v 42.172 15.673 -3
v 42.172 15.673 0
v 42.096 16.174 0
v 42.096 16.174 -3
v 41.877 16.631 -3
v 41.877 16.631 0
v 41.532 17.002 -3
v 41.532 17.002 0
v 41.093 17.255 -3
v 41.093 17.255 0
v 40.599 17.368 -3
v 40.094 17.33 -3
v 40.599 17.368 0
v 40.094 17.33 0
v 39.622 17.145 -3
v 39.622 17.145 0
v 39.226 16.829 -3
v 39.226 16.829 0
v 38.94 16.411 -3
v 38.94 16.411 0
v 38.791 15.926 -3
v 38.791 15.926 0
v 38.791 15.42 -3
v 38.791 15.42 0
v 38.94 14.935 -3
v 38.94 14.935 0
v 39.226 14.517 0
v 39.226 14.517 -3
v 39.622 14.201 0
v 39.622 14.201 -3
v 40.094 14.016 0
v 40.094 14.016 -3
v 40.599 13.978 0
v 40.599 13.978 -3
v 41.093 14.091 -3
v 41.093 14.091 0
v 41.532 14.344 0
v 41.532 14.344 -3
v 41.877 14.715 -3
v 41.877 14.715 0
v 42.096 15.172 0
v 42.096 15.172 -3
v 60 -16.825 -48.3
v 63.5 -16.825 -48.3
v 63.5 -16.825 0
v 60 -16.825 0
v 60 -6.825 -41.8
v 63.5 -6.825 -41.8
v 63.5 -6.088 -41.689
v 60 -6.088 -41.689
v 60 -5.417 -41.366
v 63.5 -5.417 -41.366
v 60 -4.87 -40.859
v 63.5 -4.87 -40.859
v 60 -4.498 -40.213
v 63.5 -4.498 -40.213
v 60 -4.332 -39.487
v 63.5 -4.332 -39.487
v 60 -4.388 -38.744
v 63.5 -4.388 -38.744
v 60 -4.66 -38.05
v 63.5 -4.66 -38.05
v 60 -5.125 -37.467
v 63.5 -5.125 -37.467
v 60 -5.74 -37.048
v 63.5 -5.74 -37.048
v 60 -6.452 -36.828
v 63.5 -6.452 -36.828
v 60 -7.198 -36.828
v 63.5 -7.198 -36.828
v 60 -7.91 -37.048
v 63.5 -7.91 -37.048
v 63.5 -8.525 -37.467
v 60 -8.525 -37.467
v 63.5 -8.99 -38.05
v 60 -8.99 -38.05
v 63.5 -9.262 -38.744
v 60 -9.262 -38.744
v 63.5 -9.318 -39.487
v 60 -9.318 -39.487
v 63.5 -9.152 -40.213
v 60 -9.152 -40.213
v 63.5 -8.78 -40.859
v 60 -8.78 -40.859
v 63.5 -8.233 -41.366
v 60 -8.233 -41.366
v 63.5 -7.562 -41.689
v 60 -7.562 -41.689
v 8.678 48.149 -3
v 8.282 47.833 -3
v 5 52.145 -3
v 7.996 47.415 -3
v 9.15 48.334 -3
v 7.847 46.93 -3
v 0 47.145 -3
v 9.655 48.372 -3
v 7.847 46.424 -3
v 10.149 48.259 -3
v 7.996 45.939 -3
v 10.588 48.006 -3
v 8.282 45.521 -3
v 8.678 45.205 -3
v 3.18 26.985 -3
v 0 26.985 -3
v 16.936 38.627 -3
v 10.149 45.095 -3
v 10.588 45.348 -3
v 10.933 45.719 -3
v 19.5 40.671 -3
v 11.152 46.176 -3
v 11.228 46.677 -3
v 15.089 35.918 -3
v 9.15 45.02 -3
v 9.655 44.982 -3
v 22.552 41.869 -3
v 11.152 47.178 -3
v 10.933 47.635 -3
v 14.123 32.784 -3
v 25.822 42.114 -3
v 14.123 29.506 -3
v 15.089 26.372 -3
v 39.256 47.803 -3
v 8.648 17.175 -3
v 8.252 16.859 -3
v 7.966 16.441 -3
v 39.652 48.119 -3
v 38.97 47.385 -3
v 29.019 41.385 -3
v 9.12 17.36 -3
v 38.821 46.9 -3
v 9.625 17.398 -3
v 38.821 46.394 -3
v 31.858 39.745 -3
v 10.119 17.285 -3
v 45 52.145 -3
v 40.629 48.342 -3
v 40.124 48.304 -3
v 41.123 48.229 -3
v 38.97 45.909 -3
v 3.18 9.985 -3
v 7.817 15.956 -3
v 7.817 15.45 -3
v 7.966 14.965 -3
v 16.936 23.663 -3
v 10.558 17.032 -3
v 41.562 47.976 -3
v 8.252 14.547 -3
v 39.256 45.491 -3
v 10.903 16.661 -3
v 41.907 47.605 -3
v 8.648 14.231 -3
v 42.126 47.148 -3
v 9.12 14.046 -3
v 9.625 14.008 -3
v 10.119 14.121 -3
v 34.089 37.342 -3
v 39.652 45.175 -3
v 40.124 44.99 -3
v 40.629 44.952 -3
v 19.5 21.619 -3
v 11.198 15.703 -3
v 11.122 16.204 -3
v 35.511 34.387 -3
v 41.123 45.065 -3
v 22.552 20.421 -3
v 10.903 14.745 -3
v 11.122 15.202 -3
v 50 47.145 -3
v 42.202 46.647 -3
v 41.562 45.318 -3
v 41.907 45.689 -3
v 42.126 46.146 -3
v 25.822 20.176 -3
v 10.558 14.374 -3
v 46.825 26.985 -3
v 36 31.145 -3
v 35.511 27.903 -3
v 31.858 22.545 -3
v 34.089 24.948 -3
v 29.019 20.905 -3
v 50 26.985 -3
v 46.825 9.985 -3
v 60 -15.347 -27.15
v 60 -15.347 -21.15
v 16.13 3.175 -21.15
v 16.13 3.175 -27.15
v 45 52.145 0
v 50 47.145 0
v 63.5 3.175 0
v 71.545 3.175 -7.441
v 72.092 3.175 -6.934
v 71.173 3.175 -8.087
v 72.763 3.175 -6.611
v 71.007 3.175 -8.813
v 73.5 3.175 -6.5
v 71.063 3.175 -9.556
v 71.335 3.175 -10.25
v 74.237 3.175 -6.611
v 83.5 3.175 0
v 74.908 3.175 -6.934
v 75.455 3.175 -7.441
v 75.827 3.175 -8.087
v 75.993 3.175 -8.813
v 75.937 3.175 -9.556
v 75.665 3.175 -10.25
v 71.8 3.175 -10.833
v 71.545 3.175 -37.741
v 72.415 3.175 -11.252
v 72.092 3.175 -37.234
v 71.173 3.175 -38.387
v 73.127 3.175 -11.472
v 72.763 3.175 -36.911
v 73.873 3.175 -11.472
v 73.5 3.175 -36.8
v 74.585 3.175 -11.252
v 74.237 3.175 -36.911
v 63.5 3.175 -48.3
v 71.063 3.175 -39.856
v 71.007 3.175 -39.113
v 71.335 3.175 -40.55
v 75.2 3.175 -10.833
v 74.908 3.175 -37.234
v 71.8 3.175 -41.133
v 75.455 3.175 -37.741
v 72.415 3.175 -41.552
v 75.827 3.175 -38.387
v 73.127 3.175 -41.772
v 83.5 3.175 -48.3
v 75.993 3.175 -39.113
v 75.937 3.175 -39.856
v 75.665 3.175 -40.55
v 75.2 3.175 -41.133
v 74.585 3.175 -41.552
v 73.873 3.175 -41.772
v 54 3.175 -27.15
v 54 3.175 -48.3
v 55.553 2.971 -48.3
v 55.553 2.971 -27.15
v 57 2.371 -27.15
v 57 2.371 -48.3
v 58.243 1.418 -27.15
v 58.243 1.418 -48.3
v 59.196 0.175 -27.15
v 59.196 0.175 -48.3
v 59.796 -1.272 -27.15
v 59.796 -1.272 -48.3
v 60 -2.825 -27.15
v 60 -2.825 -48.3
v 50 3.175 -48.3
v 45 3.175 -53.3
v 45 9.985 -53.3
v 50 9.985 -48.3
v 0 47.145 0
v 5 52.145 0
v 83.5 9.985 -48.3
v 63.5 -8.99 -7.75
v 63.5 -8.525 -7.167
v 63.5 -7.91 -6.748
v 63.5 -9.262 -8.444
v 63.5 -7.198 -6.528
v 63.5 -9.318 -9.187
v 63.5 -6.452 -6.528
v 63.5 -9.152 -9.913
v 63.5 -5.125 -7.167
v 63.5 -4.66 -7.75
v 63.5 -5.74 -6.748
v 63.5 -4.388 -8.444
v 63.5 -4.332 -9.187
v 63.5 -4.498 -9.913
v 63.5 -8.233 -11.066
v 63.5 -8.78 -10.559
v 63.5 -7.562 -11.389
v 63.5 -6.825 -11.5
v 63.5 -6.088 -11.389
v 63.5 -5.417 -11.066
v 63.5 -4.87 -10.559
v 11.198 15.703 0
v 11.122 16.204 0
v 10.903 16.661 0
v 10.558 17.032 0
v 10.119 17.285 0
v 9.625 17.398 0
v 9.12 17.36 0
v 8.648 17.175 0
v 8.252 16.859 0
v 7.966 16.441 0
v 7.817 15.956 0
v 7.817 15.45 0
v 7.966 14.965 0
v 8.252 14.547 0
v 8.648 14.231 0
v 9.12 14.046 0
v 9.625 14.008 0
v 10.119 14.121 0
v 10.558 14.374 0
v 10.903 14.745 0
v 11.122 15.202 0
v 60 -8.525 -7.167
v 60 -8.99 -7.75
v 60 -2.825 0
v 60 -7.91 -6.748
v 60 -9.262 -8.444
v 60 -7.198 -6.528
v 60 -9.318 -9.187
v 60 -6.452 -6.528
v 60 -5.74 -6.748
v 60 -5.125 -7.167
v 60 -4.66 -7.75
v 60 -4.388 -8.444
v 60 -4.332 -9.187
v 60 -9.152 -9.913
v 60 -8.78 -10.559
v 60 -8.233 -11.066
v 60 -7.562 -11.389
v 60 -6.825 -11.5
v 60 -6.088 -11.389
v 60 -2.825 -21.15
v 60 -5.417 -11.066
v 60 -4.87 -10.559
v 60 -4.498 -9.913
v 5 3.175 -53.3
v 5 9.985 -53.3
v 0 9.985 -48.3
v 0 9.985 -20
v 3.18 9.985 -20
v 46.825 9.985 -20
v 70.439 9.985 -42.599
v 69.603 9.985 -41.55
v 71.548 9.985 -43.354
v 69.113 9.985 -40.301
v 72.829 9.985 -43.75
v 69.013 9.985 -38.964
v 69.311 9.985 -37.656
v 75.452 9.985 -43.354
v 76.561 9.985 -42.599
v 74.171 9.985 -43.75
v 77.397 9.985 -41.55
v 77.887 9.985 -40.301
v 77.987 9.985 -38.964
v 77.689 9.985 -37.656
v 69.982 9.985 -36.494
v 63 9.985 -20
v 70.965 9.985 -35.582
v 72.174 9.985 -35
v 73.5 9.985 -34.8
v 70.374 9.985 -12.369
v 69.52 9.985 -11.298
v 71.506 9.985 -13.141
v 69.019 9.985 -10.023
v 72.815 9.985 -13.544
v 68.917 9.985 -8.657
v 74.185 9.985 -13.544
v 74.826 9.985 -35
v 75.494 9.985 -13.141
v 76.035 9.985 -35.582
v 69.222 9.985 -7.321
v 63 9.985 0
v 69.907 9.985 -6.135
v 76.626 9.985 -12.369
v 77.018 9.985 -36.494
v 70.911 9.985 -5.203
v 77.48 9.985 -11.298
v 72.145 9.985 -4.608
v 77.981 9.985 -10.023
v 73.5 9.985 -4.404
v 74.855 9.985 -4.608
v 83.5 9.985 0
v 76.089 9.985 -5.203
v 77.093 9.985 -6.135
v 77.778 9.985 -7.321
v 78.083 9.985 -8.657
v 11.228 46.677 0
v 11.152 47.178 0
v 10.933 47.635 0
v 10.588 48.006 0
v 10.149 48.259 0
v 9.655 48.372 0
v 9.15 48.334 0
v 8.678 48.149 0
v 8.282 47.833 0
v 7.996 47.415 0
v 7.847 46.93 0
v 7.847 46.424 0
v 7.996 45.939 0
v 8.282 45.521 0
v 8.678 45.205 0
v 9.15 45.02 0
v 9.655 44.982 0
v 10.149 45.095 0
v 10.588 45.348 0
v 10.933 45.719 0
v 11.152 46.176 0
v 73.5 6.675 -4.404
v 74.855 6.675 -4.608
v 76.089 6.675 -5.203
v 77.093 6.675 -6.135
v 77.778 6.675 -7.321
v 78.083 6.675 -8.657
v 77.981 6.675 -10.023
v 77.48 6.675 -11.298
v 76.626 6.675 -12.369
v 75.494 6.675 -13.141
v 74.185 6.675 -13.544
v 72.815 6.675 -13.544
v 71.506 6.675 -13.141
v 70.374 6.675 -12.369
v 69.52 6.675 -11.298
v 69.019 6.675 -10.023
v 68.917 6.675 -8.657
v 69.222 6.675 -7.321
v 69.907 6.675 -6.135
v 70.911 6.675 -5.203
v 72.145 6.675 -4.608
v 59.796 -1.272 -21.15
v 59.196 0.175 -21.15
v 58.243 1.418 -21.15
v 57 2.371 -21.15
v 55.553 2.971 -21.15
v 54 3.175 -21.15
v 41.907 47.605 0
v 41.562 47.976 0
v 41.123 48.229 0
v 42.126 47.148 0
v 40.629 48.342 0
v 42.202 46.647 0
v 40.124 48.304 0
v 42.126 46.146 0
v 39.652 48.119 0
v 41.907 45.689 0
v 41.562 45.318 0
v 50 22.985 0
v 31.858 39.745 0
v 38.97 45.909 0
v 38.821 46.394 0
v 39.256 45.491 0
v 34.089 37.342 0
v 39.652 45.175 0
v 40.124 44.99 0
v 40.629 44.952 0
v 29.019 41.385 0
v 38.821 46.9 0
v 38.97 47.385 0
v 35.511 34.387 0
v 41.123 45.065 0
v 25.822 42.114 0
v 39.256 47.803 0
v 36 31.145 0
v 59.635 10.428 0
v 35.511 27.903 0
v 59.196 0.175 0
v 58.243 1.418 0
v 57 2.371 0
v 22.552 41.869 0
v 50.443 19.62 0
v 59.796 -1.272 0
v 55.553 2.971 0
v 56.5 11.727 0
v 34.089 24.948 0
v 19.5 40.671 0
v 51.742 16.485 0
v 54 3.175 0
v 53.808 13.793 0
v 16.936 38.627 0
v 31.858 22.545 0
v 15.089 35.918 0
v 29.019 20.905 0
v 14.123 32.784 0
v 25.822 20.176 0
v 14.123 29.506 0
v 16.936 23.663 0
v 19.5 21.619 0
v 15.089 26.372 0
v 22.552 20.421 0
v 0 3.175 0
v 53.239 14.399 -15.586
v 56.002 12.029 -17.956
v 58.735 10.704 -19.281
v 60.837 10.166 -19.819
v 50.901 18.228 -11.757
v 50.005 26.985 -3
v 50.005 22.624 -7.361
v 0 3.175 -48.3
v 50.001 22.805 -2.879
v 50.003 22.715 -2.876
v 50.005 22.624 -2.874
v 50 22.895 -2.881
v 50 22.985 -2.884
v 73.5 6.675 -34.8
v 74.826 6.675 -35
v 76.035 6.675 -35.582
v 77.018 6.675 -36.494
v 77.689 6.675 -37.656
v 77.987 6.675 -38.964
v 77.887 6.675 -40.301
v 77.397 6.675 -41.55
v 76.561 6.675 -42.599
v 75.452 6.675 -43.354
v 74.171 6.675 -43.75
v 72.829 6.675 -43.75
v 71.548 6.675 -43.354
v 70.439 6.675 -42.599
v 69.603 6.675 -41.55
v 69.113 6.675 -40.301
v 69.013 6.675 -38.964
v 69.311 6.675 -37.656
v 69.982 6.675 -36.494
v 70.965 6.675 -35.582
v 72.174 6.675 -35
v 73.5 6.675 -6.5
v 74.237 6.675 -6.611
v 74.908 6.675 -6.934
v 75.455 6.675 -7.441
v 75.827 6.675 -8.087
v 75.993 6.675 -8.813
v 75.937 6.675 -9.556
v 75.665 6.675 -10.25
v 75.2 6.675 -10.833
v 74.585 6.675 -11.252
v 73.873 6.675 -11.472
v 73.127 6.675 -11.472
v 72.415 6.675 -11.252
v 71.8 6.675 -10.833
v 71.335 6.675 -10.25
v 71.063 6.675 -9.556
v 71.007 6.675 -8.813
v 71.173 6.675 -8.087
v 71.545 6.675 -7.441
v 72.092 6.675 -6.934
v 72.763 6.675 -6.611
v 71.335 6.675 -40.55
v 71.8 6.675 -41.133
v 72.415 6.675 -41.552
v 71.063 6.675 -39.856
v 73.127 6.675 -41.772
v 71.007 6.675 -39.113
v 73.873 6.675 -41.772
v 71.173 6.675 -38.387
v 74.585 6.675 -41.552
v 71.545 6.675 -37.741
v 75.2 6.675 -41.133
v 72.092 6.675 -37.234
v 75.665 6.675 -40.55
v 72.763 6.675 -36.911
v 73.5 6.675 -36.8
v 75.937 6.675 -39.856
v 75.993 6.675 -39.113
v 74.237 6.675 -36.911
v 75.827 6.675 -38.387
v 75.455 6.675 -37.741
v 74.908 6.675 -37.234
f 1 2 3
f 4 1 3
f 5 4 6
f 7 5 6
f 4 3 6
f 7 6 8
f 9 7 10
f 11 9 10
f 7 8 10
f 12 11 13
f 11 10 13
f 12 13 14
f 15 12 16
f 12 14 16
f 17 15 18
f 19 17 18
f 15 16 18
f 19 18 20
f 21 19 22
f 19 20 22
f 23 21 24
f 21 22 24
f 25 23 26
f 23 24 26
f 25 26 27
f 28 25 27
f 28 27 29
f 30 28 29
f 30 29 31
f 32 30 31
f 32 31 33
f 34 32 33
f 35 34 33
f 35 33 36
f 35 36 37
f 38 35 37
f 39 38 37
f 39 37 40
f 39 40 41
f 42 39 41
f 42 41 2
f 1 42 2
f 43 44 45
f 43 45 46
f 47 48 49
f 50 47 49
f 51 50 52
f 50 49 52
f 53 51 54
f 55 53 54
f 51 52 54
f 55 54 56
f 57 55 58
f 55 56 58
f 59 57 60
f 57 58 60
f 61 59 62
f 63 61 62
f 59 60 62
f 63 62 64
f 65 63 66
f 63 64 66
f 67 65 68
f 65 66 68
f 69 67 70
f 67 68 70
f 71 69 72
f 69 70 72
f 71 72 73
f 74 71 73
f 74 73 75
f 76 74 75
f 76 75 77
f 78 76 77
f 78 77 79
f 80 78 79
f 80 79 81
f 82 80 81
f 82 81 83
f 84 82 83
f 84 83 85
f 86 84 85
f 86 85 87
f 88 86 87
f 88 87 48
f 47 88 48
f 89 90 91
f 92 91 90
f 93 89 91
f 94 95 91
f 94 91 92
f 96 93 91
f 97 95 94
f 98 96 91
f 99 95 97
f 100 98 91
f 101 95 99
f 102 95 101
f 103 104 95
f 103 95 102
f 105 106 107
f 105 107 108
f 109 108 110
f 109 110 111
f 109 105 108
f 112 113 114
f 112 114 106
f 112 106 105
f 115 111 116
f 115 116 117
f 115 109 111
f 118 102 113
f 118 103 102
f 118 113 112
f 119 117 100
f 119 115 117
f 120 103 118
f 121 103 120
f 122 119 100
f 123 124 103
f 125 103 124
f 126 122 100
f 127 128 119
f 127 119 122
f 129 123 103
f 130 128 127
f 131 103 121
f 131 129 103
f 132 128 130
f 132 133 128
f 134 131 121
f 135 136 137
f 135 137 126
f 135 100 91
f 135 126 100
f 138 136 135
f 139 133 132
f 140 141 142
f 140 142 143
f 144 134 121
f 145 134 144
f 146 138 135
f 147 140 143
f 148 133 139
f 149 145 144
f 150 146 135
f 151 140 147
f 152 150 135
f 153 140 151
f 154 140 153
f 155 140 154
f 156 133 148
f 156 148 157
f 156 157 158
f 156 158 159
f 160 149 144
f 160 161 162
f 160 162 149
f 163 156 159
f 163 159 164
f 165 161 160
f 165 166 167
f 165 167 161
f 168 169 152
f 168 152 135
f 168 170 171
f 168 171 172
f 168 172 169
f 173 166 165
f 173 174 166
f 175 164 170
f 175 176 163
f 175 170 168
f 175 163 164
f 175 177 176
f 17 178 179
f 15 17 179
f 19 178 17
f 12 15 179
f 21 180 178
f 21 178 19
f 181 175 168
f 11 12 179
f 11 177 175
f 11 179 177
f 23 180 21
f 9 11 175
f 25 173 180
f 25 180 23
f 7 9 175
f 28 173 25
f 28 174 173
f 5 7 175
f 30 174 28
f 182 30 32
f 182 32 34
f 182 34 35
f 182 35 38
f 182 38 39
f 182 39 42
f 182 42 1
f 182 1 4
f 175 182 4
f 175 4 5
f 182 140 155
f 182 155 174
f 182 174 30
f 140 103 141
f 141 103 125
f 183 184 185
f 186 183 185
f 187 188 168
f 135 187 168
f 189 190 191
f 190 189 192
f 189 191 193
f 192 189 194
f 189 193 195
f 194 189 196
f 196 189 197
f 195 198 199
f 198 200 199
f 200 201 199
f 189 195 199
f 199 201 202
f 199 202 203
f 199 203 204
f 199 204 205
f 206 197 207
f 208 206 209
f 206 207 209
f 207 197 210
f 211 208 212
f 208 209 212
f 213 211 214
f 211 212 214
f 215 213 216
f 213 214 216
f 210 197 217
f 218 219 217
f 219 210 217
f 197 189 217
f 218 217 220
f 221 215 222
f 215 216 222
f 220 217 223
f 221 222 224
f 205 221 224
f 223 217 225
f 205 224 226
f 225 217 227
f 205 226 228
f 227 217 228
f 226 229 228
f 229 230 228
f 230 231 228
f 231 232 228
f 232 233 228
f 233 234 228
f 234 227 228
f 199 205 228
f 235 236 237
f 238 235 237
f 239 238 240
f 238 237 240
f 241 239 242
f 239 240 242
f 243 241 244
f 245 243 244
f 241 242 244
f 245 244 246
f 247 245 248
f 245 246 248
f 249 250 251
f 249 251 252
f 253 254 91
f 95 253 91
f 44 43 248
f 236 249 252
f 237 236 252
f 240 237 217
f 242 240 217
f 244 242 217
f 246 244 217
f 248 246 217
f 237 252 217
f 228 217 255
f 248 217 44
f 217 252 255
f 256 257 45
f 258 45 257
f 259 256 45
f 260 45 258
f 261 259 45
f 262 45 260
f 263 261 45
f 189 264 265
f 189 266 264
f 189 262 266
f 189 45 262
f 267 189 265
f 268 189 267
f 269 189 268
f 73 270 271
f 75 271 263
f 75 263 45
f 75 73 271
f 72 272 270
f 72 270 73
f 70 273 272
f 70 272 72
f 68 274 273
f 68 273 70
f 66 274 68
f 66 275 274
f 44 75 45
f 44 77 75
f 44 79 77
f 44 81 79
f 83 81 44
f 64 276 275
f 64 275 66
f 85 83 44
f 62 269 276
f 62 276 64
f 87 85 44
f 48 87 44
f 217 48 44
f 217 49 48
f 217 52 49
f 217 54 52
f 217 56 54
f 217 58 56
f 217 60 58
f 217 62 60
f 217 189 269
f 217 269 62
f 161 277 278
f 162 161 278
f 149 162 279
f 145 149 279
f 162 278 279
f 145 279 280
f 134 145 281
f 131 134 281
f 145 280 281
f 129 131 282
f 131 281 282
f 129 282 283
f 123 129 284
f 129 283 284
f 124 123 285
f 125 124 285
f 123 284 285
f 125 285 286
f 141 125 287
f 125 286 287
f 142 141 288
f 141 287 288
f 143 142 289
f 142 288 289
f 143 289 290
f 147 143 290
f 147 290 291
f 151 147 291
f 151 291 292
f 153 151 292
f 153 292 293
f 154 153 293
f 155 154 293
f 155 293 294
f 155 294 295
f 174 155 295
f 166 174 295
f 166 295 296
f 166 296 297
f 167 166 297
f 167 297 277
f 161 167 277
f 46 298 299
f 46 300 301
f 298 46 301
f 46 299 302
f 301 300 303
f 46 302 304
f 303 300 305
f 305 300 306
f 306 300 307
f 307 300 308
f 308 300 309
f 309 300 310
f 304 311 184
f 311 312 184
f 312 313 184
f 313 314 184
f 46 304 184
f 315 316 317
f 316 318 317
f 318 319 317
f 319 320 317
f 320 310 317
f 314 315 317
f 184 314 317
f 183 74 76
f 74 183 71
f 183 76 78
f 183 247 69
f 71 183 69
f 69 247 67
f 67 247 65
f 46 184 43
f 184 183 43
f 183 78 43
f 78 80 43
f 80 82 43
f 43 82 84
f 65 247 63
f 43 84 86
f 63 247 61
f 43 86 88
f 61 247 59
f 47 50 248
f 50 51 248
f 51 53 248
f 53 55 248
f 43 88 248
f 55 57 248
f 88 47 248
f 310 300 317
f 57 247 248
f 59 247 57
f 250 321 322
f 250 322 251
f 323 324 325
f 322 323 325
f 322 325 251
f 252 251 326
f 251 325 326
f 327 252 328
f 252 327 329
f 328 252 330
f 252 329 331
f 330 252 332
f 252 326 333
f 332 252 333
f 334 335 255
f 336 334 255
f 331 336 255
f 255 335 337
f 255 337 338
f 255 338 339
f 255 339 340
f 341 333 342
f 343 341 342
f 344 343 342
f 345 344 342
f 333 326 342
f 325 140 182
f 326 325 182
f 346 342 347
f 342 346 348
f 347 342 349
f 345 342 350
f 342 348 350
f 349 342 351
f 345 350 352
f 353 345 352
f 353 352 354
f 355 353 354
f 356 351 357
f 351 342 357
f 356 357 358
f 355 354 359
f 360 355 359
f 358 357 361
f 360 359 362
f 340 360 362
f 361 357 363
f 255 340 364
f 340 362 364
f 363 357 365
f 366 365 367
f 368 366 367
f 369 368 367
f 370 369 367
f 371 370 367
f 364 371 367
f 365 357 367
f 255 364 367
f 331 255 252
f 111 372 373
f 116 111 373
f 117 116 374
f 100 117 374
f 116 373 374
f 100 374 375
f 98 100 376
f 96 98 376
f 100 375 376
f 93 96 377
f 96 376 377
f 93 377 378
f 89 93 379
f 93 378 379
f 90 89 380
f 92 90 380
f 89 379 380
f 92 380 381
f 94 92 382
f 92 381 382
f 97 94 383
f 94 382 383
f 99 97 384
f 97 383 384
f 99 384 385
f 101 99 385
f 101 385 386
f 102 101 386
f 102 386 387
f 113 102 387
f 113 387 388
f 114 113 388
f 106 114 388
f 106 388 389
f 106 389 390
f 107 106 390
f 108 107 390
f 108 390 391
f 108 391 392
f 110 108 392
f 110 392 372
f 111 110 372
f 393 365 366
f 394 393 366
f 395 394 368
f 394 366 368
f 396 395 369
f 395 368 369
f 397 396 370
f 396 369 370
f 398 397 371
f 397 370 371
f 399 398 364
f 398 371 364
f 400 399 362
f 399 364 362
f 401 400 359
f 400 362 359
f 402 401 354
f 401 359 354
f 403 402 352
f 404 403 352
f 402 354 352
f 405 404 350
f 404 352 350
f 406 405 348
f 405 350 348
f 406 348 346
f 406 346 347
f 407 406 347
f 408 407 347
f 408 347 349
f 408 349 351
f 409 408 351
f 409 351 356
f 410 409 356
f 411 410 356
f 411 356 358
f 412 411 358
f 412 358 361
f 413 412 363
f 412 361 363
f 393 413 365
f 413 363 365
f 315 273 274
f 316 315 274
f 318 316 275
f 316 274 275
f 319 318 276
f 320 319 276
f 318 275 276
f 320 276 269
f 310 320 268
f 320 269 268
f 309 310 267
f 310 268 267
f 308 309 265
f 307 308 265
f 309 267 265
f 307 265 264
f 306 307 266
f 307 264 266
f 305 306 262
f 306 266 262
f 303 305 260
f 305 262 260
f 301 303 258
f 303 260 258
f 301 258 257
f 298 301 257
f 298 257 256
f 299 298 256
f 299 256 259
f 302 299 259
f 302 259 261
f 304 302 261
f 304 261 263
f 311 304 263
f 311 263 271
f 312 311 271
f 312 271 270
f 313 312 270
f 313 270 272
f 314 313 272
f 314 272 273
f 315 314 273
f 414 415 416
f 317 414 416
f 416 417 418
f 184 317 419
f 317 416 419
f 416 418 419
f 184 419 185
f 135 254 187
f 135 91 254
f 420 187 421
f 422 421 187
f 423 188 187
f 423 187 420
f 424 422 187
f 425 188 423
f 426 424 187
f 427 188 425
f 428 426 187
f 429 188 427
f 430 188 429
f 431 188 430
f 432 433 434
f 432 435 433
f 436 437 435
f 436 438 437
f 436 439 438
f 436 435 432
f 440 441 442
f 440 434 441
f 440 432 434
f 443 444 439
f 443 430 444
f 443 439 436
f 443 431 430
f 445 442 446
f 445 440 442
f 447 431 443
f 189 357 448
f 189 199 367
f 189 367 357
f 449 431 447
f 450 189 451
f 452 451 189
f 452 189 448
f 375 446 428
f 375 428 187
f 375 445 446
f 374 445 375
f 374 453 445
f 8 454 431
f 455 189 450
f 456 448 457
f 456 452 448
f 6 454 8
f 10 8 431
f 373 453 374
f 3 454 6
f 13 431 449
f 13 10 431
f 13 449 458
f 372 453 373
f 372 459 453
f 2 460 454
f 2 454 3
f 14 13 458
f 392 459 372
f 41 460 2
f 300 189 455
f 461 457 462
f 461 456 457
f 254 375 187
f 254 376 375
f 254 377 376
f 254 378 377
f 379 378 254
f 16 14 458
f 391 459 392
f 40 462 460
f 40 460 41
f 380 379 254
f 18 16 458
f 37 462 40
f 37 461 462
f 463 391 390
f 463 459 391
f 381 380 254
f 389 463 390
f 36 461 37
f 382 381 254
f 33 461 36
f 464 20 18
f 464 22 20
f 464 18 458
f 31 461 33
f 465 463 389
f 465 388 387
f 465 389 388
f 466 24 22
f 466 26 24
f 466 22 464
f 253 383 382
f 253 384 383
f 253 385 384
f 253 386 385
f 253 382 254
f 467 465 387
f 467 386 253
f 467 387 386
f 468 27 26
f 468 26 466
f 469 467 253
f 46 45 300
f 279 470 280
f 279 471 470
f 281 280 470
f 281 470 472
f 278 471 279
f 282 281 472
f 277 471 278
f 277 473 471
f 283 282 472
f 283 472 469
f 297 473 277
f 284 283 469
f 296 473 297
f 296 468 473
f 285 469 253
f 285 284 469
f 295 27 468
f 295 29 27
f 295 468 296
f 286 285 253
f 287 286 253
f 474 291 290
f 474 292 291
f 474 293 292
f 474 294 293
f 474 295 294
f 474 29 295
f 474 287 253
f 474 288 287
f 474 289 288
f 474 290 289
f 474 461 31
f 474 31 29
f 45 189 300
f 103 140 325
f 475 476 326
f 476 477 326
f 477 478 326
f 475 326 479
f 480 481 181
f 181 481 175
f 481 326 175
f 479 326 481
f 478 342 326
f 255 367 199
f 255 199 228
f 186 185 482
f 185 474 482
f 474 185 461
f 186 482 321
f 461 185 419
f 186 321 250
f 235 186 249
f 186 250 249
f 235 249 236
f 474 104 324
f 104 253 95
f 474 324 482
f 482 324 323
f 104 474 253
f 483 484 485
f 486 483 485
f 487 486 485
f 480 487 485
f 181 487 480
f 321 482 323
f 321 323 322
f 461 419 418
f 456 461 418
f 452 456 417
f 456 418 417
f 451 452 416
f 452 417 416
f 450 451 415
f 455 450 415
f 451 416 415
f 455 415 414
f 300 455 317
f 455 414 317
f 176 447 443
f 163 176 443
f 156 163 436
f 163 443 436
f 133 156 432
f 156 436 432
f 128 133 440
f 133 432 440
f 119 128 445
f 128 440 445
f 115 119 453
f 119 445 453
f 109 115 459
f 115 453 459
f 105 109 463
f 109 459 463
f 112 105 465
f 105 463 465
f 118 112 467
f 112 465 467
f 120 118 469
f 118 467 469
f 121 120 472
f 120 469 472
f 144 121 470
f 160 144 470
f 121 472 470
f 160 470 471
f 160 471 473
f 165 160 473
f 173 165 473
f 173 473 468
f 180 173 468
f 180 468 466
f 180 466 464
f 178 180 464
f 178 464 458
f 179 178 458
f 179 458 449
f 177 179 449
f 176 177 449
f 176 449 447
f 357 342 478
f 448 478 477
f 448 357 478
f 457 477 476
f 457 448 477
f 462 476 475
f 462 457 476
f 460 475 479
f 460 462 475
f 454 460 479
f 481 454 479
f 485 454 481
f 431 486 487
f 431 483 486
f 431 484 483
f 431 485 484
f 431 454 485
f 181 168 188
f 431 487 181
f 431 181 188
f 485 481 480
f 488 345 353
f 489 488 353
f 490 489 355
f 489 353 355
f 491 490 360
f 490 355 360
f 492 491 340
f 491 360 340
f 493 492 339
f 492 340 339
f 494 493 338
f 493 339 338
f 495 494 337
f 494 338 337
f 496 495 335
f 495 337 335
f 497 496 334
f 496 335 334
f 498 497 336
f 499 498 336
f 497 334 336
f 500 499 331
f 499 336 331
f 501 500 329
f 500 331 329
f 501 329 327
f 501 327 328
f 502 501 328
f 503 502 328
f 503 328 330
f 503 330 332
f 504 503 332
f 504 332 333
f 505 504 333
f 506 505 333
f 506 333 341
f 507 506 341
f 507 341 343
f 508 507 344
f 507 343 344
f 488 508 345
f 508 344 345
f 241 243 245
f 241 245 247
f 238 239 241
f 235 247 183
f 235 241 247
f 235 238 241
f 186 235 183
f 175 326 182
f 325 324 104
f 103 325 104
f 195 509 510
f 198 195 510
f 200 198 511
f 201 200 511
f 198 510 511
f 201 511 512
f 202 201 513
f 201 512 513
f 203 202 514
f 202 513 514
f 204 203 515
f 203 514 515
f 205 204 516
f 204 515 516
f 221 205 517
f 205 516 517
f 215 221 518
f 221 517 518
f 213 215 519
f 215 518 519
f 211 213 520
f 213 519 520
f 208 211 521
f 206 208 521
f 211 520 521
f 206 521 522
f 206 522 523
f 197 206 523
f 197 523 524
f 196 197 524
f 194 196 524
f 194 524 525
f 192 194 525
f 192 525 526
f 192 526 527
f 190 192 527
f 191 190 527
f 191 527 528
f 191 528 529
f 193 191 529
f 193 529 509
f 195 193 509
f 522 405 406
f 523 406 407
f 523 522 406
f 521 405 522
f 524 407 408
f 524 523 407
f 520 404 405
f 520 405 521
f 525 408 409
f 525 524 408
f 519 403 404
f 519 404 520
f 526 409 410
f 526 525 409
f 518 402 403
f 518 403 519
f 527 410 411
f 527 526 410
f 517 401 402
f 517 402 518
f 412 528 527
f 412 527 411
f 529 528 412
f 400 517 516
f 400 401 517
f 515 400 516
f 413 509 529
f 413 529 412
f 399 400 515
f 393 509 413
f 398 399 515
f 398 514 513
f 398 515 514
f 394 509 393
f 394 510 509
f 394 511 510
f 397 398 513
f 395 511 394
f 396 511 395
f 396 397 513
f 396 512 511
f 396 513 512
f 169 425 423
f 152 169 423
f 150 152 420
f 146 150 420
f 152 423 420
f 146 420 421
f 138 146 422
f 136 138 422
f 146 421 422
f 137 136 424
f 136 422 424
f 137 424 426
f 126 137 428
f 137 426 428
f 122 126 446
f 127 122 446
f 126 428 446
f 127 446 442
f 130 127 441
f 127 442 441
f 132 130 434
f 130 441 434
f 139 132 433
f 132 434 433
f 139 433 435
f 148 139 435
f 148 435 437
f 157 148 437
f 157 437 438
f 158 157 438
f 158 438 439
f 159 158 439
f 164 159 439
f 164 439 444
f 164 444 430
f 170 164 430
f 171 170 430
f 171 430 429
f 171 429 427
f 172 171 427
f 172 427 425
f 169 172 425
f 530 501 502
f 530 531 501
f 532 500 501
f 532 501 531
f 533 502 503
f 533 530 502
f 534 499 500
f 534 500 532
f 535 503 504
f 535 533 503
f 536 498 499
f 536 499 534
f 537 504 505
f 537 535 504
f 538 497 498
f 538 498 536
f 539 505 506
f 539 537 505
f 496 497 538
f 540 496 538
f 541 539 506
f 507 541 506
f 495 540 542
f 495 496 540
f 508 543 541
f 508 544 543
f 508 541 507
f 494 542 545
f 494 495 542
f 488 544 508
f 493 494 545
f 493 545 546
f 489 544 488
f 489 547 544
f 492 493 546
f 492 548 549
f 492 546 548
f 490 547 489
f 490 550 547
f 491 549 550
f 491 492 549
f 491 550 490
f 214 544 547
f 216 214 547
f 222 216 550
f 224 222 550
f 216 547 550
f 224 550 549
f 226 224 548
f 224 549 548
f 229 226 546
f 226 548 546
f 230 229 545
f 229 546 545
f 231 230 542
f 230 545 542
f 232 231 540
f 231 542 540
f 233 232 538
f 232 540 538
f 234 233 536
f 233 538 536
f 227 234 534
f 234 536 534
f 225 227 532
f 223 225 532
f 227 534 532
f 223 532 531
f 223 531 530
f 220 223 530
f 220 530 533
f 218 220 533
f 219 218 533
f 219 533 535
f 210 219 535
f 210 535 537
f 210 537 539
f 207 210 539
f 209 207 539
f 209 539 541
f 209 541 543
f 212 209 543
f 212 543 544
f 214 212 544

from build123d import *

# Parameters (mm, degrees)
SKETCH1_W               = 50
SKETCH1_H               = 53.3
BOSS_EXTRUDE1_DEPTH     = 3.175
SKETCH2_W               = 50
SKETCH2_H               = 3
BOSS_EXTRUDE2_DEPTH     = 48.97
SKETCH3_W               = 3.175
SKETCH3_H               = 15
SKETCH3_H_2             = 15.175
BOSS_EXTRUDE3_DEPTH     = 20
CUT_EXTRUDE1_DEPTH      = 65
SKETCH5_R               = 11
SKETCH5_R_2             = 1.7
CUT_EXTRUDE2_DEPTH      = 65
CUT_EXTRUDE3_DEPTH      = 65
CHAMFER1_SIZE           = 5
FILLET1_R               = 5
BOSS_EXTRU_1_DEPTH      = 6.81
ENL_V_MAT_EXTRU_1_DEPTH = 6.81
BOSS_EXTRU_2_DEPTH      = 3.18
BOSS_EXTRU_3_DEPTH      = 3.18
ESQUISSE5_W             = 13.5
ESQUISSE5_H             = 48.3
BOSS_EXTRU_4_DEPTH      = 6.81
ESQUISSE6_W             = 20
ESQUISSE6_H             = 48.3
ESQUISSE6_R             = 2.5
BOSS_EXTRU_5_DEPTH      = 6.81
ESQUISSE7_W             = 3.5
ESQUISSE7_H             = 48.3
BOSS_EXTRU_6_DEPTH      = 20
ESQUISSE8_R             = 2.5
ENL_V_MAT_EXTRU_2_DEPTH = 10
ESQUISSE9_R             = 4.5
ESQUISSE9_R_2           = 4.595775112
ENL_V_MAT_EXTRU_3_DEPTH = 3.31
CONG_1_R                = 6
CONG_2_R                = 13
BOSS_EXTRU_7_DEPTH      = 3
BOSS_EXTRU_7_DEPTH_BACK = 3


with BuildPart() as part:
    # Sketch1 → Boss-Extrude1 (new body)
    with BuildSketch(Plane(origin=(0, 0, 0), x_dir=(1, 0, 0), z_dir=(0, 1, 0))):
        with Locations((25, 26.65)):
            Rectangle(SKETCH1_W, SKETCH1_H)
    extrude(amount=BOSS_EXTRUDE1_DEPTH)

    # Sketch2 → Boss-Extrude2 (add)
    with BuildSketch(Plane(origin=(0, 3.175, 0), x_dir=(1, 0, 0), z_dir=(0, 1, 0))):
        with Locations((25, 1.5)):
            Rectangle(SKETCH2_W, SKETCH2_H)
    extrude(amount=BOSS_EXTRUDE2_DEPTH)

    # Sketch3 → Boss-Extrude3 (add)
    with BuildSketch(Plane(origin=(0, 3.175, 0), x_dir=(1, 0, 0), z_dir=(0, 1, 0))):
        with Locations((1.5875, 10.5)):
            Rectangle(SKETCH3_W, SKETCH3_H)
        with Locations((48.4125, 10.5875)):
            Rectangle(SKETCH3_W, SKETCH3_H_2)
    extrude(amount=BOSS_EXTRUDE3_DEPTH)

    # Sketch4 → Cut-Extrude1 (cut)
    with BuildSketch(Plane(origin=(50, 0, 0), x_dir=(0, 0, -1), z_dir=(1, 0, 0))):
        Polygon((18.175, 3.175), (3, 23.175), (18.175, 23.175), align=None)
    extrude(amount=-CUT_EXTRUDE1_DEPTH, mode=Mode.SUBTRACT)

    # Sketch5 → Cut-Extrude2 (cut)
    with BuildSketch(Plane.XY):
        with Locations((25, 31.145)):
            Circle(SKETCH5_R)
        with Locations((40.502, 46.647)):
            Circle(SKETCH5_R_2)
        with Locations((9.528, 46.677)):
            Circle(SKETCH5_R_2)
        with Locations((9.498, 15.703)):
            Circle(SKETCH5_R_2)
        with Locations((40.472, 15.673)):
            Circle(SKETCH5_R_2)
    extrude(amount=-CUT_EXTRUDE2_DEPTH, mode=Mode.SUBTRACT)

    # Sketch6 → Cut-Extrude3 (cut)
    with BuildSketch(Plane(origin=(0, 3.175, 0), x_dir=(1, 0, 0), z_dir=(0, 1, 0))):
        with BuildLine():
            ThreePointArc((42.125, 42.3), (40, 44.425), (37.875, 42.3))
            Line((37.875, 42.3), (37.875, 12.3))
            ThreePointArc((37.875, 12.3), (40, 10.175), (42.125, 12.3))
            Line((42.125, 12.3), (42.125, 42.3))
        make_face()
        with BuildLine():
            Line((7.875, 42.3), (7.875, 12.3))
            ThreePointArc((7.875, 12.3), (10, 10.175), (12.125, 12.3))
            Line((12.125, 12.3), (12.125, 42.3))
            ThreePointArc((12.125, 42.3), (10, 44.425), (7.875, 42.3))
        make_face()
    extrude(amount=-CUT_EXTRUDE3_DEPTH, mode=Mode.SUBTRACT)

    # Chamfer1
    chamfer1_edges = [part.edges().sort_by_distance(p)[0] for p in [
        (0, 1.5875, -53.3),
        (50, 1.5875, -53.3),
        (0, 52.145, -1.5),
        (50, 52.145, -1.5),
    ]]
    chamfer(chamfer1_edges, length=CHAMFER1_SIZE)

    # Fillet1
    fillet1_edges = [part.edges().sort_by_distance(p)[0] for p in [
        (25, 3.175, -3),
        (25, 0, 0),
    ]]
    fillet(fillet1_edges, radius=FILLET1_R)

    # Esquisse2 → Boss.-Extru.1 (add)
    with BuildSketch(Plane(origin=(0, 3.175, 0), x_dir=(1, 0, 0), z_dir=(0, 1, 0))):
        Polygon((0, 48.3), (5, 53.3), (45, 53.3), (50, 48.3), (50, 0), (0, 0), align=None)
    extrude(amount=BOSS_EXTRU_1_DEPTH)

    # Esquisse2<2> → Enlèv. mat.-Extru.1 (cut)
    with BuildSketch(Plane(origin=(0, 3.175, 0), x_dir=(1, 0, 0), z_dir=(0, 1, 0))):
        Polygon((0, 48.3), (5, 53.3), (45, 53.3), (50, 48.3), (50, 0), (0, 0), align=None)
    extrude(amount=-ENL_V_MAT_EXTRU_1_DEPTH, mode=Mode.SUBTRACT)

    # Esquisse3 → Boss.-Extru.2 (add)
    with BuildSketch(Plane.ZY):
        Polygon((-20, 9.985), (-3, 26.985), (-3, 9.985), align=None)
    extrude(amount=-BOSS_EXTRU_2_DEPTH)

    # Esquisse4 → Boss.-Extru.3 (add)
    with BuildSketch(Plane.ZY.offset(-46.825)):
        Polygon((-20, 9.985), (-2.507234201, 9.985), (-3, 26.985), align=None)
    extrude(amount=-BOSS_EXTRU_3_DEPTH)

    # Esquisse5 → Boss.-Extru.4 (add)
    with BuildSketch(Plane(origin=(0, 9.985, 0), x_dir=(1, 0, 0), z_dir=(0, 1, 0))):
        with Locations((56.75, 24.15)):
            Rectangle(ESQUISSE5_W, ESQUISSE5_H)
    extrude(amount=-BOSS_EXTRU_4_DEPTH)

    # Esquisse6 → Boss.-Extru.5 (add)
    with BuildSketch(Plane(origin=(0, 9.985, 0), x_dir=(1, 0, 0), z_dir=(0, 1, 0))):
        with Locations((73.5, 24.15)):
            Rectangle(ESQUISSE6_W, ESQUISSE6_H)
        with Locations(Location((73.5, 39.3, 0), (0, 0, 270))):
            Circle(ESQUISSE6_R, mode=Mode.SUBTRACT)
        with Locations(Location((73.5, 9, 0), (0, 0, 270))):
            Circle(ESQUISSE6_R, mode=Mode.SUBTRACT)
    extrude(amount=-BOSS_EXTRU_5_DEPTH)

    # Esquisse7 → Boss.-Extru.6 (add)
    with BuildSketch(Plane(origin=(0, 3.175, 0), x_dir=(-1, 0, 0), z_dir=(0, -1, 0))):
        with Locations((-61.75, 24.15)):
            Rectangle(ESQUISSE7_W, ESQUISSE7_H)
    extrude(amount=BOSS_EXTRU_6_DEPTH)

    # Esquisse8 → Enlèv. mat.-Extru.2 (cut)
    with BuildSketch(Plane(origin=(63.5, 0, 0), x_dir=(0, 0, -1), z_dir=(1, 0, 0))):
        with Locations((9, -6.825)):
            Circle(ESQUISSE8_R)
        with Locations((39.3, -6.825)):
            Circle(ESQUISSE8_R)
    extrude(amount=-ENL_V_MAT_EXTRU_2_DEPTH, mode=Mode.SUBTRACT)

    # Esquisse9 → Enlèv. mat.-Extru.3 (cut)
    with BuildSketch(Plane(origin=(0, 9.985, 0), x_dir=(1, 0, 0), z_dir=(0, 1, 0))):
        with Locations(Location((73.5, 39.3, 0), (0, 0, 270))):
            Circle(ESQUISSE9_R)
        with Locations(Location((73.5, 9, 0), (0, 0, 270))):
            Circle(ESQUISSE9_R_2)
    extrude(amount=-ENL_V_MAT_EXTRU_3_DEPTH, mode=Mode.SUBTRACT)

    # Congé1
    cong_1_edges = [part.edges().sort_by_distance(p)[0] for p in [
        (60, 3.175, -24.15),
    ]]
    fillet(cong_1_edges, radius=CONG_1_R)

    # Congé2
    # the kernel refuses this fillet: 13 mm, written as the material it adds along each edge
    with BuildSketch(Plane(origin=(50, 9.985, 0), x_dir=(1, 0, 0), z_dir=(0, 0, -1))) as cong_2_piece_1_section:
        with BuildLine():
            CenterArc((CONG_2_R, -CONG_2_R), CONG_2_R, 90, 90)
            Line((0, -CONG_2_R), (0, 0))
            Line((0, 0), (CONG_2_R, 0))
        make_face()
    cong_2_piece_1 = extrude(amount=35.007234201, mode=Mode.PRIVATE)
    cong_2_piece_1 = split(cong_2_piece_1, bisect_by=Plane(origin=(52.869924632, 20.818582146, -9.166417854), z_dir=(0, -0.7071067811865461, 0.707106781186549)), keep=Keep.TOP, mode=Mode.PRIVATE)
    add(cong_2_piece_1)

    # Esquisse11 → Boss.-Extru.7 (add, two sides: drawn at the far end of the back side and taken through both)
    with BuildSketch(Plane(origin=(0, 0, -24.15), x_dir=(-1, 0, 0), z_dir=(0, 0, -1)).offset(-BOSS_EXTRU_7_DEPTH_BACK)):
        Polygon((-63.5, -16.825), (0, 9.985), (-63.5, 9.985), align=None)
    extrude(amount=BOSS_EXTRU_7_DEPTH + BOSS_EXTRU_7_DEPTH_BACK)


solid = part.part
